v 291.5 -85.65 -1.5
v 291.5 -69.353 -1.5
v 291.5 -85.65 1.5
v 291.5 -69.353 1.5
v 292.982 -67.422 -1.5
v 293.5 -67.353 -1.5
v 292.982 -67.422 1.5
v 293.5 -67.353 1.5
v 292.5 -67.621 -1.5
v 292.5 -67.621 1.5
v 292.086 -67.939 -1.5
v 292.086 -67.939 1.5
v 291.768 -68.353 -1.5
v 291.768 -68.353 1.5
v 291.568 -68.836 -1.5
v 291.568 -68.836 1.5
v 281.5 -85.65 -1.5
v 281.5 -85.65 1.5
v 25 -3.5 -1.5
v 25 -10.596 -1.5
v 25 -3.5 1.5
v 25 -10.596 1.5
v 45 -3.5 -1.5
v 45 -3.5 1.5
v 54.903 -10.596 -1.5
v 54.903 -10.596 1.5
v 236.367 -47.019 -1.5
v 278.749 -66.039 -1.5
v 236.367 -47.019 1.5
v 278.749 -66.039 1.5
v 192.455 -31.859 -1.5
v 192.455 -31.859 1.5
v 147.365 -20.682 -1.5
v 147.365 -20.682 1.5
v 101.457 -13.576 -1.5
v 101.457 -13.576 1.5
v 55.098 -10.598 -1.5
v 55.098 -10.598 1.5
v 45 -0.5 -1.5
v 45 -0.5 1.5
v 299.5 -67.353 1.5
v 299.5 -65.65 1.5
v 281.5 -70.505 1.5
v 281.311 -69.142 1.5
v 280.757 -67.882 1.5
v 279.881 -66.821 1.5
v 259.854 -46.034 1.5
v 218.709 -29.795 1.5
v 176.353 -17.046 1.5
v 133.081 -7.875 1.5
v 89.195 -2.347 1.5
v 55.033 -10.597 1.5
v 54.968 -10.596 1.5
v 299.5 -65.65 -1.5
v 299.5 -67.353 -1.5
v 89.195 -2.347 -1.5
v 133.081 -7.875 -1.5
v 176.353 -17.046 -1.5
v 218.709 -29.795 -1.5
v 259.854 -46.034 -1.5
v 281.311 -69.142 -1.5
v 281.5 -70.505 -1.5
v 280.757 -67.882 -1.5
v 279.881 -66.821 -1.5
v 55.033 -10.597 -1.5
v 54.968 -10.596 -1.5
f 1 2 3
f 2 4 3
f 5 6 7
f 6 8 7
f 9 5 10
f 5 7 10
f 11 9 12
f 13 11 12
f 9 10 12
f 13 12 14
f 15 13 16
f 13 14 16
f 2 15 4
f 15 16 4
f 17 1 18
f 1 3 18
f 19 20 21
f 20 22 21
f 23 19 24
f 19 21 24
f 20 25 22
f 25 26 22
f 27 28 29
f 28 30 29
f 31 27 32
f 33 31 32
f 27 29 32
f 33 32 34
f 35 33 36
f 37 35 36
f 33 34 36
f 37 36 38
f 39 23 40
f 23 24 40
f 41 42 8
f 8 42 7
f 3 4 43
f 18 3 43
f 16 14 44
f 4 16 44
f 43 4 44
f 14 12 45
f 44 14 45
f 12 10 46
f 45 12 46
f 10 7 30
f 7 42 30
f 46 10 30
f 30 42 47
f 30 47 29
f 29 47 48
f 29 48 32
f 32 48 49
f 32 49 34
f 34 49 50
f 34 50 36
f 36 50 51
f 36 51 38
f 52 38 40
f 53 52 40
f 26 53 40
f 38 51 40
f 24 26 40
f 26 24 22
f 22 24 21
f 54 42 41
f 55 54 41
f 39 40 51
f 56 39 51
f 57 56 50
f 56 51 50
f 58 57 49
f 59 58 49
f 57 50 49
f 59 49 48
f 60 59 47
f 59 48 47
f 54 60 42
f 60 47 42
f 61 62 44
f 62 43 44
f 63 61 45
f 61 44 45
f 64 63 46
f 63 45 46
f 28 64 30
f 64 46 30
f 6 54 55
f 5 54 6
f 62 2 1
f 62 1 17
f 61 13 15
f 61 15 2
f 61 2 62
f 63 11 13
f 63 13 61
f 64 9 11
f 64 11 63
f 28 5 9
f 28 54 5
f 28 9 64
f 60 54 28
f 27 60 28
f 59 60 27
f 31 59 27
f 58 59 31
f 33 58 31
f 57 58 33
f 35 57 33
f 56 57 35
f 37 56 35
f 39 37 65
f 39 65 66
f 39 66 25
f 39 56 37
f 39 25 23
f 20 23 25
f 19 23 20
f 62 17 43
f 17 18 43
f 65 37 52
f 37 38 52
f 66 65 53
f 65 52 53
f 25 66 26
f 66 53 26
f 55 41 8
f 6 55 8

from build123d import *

# Parameters (mm, degrees)
BOSS_EXTRUDE1_DEPTH = 1.5


with BuildPart() as part:
    # Sketch2 → Boss-Extrude1 (new, symmetric)
    with BuildSketch(Plane.XY):
        with BuildLine():
            Line((299.5, -67.353443934), (293.5, -67.353443934))
            ThreePointArc((293.5, -67.353443934), (292.085786438, -67.939230372), (291.5, -69.353443934))
            Line((291.5, -69.353443934), (291.5, -85.649534053))
            Line((291.5, -85.649534053), (281.5, -85.649534053))
            Line((281.5, -85.649534053), (281.5, -70.504592149))
            ThreePointArc((281.5, -70.504592149), (280.757064897, -67.882112699), (278.749040614, -66.038966065))
            ThreePointArc((278.749040614, -66.038966065), (170.034876315, -25.766389615), (55.097618142, -10.598112953))
            ThreePointArc((55.097618142, -10.598112953), (55.000467449, -10.596696958), (54.903307584, -10.596224945))
            Line((54.903307584, -10.596224945), (25, -10.596224945))
            Line((25, -10.596224945), (25, -3.5))
            Line((25, -3.5), (45, -3.5))
            Line((45, -3.5), (45, -0.5))
            ThreePointArc((45, -0.5), (176.353256324, -17.04581533), (299.5, -65.649534053))
            Line((299.5, -65.649534053), (299.5, -67.353443934))
        make_face()
    extrude(amount=BOSS_EXTRUDE1_DEPTH, both=True)


solid = part.part
